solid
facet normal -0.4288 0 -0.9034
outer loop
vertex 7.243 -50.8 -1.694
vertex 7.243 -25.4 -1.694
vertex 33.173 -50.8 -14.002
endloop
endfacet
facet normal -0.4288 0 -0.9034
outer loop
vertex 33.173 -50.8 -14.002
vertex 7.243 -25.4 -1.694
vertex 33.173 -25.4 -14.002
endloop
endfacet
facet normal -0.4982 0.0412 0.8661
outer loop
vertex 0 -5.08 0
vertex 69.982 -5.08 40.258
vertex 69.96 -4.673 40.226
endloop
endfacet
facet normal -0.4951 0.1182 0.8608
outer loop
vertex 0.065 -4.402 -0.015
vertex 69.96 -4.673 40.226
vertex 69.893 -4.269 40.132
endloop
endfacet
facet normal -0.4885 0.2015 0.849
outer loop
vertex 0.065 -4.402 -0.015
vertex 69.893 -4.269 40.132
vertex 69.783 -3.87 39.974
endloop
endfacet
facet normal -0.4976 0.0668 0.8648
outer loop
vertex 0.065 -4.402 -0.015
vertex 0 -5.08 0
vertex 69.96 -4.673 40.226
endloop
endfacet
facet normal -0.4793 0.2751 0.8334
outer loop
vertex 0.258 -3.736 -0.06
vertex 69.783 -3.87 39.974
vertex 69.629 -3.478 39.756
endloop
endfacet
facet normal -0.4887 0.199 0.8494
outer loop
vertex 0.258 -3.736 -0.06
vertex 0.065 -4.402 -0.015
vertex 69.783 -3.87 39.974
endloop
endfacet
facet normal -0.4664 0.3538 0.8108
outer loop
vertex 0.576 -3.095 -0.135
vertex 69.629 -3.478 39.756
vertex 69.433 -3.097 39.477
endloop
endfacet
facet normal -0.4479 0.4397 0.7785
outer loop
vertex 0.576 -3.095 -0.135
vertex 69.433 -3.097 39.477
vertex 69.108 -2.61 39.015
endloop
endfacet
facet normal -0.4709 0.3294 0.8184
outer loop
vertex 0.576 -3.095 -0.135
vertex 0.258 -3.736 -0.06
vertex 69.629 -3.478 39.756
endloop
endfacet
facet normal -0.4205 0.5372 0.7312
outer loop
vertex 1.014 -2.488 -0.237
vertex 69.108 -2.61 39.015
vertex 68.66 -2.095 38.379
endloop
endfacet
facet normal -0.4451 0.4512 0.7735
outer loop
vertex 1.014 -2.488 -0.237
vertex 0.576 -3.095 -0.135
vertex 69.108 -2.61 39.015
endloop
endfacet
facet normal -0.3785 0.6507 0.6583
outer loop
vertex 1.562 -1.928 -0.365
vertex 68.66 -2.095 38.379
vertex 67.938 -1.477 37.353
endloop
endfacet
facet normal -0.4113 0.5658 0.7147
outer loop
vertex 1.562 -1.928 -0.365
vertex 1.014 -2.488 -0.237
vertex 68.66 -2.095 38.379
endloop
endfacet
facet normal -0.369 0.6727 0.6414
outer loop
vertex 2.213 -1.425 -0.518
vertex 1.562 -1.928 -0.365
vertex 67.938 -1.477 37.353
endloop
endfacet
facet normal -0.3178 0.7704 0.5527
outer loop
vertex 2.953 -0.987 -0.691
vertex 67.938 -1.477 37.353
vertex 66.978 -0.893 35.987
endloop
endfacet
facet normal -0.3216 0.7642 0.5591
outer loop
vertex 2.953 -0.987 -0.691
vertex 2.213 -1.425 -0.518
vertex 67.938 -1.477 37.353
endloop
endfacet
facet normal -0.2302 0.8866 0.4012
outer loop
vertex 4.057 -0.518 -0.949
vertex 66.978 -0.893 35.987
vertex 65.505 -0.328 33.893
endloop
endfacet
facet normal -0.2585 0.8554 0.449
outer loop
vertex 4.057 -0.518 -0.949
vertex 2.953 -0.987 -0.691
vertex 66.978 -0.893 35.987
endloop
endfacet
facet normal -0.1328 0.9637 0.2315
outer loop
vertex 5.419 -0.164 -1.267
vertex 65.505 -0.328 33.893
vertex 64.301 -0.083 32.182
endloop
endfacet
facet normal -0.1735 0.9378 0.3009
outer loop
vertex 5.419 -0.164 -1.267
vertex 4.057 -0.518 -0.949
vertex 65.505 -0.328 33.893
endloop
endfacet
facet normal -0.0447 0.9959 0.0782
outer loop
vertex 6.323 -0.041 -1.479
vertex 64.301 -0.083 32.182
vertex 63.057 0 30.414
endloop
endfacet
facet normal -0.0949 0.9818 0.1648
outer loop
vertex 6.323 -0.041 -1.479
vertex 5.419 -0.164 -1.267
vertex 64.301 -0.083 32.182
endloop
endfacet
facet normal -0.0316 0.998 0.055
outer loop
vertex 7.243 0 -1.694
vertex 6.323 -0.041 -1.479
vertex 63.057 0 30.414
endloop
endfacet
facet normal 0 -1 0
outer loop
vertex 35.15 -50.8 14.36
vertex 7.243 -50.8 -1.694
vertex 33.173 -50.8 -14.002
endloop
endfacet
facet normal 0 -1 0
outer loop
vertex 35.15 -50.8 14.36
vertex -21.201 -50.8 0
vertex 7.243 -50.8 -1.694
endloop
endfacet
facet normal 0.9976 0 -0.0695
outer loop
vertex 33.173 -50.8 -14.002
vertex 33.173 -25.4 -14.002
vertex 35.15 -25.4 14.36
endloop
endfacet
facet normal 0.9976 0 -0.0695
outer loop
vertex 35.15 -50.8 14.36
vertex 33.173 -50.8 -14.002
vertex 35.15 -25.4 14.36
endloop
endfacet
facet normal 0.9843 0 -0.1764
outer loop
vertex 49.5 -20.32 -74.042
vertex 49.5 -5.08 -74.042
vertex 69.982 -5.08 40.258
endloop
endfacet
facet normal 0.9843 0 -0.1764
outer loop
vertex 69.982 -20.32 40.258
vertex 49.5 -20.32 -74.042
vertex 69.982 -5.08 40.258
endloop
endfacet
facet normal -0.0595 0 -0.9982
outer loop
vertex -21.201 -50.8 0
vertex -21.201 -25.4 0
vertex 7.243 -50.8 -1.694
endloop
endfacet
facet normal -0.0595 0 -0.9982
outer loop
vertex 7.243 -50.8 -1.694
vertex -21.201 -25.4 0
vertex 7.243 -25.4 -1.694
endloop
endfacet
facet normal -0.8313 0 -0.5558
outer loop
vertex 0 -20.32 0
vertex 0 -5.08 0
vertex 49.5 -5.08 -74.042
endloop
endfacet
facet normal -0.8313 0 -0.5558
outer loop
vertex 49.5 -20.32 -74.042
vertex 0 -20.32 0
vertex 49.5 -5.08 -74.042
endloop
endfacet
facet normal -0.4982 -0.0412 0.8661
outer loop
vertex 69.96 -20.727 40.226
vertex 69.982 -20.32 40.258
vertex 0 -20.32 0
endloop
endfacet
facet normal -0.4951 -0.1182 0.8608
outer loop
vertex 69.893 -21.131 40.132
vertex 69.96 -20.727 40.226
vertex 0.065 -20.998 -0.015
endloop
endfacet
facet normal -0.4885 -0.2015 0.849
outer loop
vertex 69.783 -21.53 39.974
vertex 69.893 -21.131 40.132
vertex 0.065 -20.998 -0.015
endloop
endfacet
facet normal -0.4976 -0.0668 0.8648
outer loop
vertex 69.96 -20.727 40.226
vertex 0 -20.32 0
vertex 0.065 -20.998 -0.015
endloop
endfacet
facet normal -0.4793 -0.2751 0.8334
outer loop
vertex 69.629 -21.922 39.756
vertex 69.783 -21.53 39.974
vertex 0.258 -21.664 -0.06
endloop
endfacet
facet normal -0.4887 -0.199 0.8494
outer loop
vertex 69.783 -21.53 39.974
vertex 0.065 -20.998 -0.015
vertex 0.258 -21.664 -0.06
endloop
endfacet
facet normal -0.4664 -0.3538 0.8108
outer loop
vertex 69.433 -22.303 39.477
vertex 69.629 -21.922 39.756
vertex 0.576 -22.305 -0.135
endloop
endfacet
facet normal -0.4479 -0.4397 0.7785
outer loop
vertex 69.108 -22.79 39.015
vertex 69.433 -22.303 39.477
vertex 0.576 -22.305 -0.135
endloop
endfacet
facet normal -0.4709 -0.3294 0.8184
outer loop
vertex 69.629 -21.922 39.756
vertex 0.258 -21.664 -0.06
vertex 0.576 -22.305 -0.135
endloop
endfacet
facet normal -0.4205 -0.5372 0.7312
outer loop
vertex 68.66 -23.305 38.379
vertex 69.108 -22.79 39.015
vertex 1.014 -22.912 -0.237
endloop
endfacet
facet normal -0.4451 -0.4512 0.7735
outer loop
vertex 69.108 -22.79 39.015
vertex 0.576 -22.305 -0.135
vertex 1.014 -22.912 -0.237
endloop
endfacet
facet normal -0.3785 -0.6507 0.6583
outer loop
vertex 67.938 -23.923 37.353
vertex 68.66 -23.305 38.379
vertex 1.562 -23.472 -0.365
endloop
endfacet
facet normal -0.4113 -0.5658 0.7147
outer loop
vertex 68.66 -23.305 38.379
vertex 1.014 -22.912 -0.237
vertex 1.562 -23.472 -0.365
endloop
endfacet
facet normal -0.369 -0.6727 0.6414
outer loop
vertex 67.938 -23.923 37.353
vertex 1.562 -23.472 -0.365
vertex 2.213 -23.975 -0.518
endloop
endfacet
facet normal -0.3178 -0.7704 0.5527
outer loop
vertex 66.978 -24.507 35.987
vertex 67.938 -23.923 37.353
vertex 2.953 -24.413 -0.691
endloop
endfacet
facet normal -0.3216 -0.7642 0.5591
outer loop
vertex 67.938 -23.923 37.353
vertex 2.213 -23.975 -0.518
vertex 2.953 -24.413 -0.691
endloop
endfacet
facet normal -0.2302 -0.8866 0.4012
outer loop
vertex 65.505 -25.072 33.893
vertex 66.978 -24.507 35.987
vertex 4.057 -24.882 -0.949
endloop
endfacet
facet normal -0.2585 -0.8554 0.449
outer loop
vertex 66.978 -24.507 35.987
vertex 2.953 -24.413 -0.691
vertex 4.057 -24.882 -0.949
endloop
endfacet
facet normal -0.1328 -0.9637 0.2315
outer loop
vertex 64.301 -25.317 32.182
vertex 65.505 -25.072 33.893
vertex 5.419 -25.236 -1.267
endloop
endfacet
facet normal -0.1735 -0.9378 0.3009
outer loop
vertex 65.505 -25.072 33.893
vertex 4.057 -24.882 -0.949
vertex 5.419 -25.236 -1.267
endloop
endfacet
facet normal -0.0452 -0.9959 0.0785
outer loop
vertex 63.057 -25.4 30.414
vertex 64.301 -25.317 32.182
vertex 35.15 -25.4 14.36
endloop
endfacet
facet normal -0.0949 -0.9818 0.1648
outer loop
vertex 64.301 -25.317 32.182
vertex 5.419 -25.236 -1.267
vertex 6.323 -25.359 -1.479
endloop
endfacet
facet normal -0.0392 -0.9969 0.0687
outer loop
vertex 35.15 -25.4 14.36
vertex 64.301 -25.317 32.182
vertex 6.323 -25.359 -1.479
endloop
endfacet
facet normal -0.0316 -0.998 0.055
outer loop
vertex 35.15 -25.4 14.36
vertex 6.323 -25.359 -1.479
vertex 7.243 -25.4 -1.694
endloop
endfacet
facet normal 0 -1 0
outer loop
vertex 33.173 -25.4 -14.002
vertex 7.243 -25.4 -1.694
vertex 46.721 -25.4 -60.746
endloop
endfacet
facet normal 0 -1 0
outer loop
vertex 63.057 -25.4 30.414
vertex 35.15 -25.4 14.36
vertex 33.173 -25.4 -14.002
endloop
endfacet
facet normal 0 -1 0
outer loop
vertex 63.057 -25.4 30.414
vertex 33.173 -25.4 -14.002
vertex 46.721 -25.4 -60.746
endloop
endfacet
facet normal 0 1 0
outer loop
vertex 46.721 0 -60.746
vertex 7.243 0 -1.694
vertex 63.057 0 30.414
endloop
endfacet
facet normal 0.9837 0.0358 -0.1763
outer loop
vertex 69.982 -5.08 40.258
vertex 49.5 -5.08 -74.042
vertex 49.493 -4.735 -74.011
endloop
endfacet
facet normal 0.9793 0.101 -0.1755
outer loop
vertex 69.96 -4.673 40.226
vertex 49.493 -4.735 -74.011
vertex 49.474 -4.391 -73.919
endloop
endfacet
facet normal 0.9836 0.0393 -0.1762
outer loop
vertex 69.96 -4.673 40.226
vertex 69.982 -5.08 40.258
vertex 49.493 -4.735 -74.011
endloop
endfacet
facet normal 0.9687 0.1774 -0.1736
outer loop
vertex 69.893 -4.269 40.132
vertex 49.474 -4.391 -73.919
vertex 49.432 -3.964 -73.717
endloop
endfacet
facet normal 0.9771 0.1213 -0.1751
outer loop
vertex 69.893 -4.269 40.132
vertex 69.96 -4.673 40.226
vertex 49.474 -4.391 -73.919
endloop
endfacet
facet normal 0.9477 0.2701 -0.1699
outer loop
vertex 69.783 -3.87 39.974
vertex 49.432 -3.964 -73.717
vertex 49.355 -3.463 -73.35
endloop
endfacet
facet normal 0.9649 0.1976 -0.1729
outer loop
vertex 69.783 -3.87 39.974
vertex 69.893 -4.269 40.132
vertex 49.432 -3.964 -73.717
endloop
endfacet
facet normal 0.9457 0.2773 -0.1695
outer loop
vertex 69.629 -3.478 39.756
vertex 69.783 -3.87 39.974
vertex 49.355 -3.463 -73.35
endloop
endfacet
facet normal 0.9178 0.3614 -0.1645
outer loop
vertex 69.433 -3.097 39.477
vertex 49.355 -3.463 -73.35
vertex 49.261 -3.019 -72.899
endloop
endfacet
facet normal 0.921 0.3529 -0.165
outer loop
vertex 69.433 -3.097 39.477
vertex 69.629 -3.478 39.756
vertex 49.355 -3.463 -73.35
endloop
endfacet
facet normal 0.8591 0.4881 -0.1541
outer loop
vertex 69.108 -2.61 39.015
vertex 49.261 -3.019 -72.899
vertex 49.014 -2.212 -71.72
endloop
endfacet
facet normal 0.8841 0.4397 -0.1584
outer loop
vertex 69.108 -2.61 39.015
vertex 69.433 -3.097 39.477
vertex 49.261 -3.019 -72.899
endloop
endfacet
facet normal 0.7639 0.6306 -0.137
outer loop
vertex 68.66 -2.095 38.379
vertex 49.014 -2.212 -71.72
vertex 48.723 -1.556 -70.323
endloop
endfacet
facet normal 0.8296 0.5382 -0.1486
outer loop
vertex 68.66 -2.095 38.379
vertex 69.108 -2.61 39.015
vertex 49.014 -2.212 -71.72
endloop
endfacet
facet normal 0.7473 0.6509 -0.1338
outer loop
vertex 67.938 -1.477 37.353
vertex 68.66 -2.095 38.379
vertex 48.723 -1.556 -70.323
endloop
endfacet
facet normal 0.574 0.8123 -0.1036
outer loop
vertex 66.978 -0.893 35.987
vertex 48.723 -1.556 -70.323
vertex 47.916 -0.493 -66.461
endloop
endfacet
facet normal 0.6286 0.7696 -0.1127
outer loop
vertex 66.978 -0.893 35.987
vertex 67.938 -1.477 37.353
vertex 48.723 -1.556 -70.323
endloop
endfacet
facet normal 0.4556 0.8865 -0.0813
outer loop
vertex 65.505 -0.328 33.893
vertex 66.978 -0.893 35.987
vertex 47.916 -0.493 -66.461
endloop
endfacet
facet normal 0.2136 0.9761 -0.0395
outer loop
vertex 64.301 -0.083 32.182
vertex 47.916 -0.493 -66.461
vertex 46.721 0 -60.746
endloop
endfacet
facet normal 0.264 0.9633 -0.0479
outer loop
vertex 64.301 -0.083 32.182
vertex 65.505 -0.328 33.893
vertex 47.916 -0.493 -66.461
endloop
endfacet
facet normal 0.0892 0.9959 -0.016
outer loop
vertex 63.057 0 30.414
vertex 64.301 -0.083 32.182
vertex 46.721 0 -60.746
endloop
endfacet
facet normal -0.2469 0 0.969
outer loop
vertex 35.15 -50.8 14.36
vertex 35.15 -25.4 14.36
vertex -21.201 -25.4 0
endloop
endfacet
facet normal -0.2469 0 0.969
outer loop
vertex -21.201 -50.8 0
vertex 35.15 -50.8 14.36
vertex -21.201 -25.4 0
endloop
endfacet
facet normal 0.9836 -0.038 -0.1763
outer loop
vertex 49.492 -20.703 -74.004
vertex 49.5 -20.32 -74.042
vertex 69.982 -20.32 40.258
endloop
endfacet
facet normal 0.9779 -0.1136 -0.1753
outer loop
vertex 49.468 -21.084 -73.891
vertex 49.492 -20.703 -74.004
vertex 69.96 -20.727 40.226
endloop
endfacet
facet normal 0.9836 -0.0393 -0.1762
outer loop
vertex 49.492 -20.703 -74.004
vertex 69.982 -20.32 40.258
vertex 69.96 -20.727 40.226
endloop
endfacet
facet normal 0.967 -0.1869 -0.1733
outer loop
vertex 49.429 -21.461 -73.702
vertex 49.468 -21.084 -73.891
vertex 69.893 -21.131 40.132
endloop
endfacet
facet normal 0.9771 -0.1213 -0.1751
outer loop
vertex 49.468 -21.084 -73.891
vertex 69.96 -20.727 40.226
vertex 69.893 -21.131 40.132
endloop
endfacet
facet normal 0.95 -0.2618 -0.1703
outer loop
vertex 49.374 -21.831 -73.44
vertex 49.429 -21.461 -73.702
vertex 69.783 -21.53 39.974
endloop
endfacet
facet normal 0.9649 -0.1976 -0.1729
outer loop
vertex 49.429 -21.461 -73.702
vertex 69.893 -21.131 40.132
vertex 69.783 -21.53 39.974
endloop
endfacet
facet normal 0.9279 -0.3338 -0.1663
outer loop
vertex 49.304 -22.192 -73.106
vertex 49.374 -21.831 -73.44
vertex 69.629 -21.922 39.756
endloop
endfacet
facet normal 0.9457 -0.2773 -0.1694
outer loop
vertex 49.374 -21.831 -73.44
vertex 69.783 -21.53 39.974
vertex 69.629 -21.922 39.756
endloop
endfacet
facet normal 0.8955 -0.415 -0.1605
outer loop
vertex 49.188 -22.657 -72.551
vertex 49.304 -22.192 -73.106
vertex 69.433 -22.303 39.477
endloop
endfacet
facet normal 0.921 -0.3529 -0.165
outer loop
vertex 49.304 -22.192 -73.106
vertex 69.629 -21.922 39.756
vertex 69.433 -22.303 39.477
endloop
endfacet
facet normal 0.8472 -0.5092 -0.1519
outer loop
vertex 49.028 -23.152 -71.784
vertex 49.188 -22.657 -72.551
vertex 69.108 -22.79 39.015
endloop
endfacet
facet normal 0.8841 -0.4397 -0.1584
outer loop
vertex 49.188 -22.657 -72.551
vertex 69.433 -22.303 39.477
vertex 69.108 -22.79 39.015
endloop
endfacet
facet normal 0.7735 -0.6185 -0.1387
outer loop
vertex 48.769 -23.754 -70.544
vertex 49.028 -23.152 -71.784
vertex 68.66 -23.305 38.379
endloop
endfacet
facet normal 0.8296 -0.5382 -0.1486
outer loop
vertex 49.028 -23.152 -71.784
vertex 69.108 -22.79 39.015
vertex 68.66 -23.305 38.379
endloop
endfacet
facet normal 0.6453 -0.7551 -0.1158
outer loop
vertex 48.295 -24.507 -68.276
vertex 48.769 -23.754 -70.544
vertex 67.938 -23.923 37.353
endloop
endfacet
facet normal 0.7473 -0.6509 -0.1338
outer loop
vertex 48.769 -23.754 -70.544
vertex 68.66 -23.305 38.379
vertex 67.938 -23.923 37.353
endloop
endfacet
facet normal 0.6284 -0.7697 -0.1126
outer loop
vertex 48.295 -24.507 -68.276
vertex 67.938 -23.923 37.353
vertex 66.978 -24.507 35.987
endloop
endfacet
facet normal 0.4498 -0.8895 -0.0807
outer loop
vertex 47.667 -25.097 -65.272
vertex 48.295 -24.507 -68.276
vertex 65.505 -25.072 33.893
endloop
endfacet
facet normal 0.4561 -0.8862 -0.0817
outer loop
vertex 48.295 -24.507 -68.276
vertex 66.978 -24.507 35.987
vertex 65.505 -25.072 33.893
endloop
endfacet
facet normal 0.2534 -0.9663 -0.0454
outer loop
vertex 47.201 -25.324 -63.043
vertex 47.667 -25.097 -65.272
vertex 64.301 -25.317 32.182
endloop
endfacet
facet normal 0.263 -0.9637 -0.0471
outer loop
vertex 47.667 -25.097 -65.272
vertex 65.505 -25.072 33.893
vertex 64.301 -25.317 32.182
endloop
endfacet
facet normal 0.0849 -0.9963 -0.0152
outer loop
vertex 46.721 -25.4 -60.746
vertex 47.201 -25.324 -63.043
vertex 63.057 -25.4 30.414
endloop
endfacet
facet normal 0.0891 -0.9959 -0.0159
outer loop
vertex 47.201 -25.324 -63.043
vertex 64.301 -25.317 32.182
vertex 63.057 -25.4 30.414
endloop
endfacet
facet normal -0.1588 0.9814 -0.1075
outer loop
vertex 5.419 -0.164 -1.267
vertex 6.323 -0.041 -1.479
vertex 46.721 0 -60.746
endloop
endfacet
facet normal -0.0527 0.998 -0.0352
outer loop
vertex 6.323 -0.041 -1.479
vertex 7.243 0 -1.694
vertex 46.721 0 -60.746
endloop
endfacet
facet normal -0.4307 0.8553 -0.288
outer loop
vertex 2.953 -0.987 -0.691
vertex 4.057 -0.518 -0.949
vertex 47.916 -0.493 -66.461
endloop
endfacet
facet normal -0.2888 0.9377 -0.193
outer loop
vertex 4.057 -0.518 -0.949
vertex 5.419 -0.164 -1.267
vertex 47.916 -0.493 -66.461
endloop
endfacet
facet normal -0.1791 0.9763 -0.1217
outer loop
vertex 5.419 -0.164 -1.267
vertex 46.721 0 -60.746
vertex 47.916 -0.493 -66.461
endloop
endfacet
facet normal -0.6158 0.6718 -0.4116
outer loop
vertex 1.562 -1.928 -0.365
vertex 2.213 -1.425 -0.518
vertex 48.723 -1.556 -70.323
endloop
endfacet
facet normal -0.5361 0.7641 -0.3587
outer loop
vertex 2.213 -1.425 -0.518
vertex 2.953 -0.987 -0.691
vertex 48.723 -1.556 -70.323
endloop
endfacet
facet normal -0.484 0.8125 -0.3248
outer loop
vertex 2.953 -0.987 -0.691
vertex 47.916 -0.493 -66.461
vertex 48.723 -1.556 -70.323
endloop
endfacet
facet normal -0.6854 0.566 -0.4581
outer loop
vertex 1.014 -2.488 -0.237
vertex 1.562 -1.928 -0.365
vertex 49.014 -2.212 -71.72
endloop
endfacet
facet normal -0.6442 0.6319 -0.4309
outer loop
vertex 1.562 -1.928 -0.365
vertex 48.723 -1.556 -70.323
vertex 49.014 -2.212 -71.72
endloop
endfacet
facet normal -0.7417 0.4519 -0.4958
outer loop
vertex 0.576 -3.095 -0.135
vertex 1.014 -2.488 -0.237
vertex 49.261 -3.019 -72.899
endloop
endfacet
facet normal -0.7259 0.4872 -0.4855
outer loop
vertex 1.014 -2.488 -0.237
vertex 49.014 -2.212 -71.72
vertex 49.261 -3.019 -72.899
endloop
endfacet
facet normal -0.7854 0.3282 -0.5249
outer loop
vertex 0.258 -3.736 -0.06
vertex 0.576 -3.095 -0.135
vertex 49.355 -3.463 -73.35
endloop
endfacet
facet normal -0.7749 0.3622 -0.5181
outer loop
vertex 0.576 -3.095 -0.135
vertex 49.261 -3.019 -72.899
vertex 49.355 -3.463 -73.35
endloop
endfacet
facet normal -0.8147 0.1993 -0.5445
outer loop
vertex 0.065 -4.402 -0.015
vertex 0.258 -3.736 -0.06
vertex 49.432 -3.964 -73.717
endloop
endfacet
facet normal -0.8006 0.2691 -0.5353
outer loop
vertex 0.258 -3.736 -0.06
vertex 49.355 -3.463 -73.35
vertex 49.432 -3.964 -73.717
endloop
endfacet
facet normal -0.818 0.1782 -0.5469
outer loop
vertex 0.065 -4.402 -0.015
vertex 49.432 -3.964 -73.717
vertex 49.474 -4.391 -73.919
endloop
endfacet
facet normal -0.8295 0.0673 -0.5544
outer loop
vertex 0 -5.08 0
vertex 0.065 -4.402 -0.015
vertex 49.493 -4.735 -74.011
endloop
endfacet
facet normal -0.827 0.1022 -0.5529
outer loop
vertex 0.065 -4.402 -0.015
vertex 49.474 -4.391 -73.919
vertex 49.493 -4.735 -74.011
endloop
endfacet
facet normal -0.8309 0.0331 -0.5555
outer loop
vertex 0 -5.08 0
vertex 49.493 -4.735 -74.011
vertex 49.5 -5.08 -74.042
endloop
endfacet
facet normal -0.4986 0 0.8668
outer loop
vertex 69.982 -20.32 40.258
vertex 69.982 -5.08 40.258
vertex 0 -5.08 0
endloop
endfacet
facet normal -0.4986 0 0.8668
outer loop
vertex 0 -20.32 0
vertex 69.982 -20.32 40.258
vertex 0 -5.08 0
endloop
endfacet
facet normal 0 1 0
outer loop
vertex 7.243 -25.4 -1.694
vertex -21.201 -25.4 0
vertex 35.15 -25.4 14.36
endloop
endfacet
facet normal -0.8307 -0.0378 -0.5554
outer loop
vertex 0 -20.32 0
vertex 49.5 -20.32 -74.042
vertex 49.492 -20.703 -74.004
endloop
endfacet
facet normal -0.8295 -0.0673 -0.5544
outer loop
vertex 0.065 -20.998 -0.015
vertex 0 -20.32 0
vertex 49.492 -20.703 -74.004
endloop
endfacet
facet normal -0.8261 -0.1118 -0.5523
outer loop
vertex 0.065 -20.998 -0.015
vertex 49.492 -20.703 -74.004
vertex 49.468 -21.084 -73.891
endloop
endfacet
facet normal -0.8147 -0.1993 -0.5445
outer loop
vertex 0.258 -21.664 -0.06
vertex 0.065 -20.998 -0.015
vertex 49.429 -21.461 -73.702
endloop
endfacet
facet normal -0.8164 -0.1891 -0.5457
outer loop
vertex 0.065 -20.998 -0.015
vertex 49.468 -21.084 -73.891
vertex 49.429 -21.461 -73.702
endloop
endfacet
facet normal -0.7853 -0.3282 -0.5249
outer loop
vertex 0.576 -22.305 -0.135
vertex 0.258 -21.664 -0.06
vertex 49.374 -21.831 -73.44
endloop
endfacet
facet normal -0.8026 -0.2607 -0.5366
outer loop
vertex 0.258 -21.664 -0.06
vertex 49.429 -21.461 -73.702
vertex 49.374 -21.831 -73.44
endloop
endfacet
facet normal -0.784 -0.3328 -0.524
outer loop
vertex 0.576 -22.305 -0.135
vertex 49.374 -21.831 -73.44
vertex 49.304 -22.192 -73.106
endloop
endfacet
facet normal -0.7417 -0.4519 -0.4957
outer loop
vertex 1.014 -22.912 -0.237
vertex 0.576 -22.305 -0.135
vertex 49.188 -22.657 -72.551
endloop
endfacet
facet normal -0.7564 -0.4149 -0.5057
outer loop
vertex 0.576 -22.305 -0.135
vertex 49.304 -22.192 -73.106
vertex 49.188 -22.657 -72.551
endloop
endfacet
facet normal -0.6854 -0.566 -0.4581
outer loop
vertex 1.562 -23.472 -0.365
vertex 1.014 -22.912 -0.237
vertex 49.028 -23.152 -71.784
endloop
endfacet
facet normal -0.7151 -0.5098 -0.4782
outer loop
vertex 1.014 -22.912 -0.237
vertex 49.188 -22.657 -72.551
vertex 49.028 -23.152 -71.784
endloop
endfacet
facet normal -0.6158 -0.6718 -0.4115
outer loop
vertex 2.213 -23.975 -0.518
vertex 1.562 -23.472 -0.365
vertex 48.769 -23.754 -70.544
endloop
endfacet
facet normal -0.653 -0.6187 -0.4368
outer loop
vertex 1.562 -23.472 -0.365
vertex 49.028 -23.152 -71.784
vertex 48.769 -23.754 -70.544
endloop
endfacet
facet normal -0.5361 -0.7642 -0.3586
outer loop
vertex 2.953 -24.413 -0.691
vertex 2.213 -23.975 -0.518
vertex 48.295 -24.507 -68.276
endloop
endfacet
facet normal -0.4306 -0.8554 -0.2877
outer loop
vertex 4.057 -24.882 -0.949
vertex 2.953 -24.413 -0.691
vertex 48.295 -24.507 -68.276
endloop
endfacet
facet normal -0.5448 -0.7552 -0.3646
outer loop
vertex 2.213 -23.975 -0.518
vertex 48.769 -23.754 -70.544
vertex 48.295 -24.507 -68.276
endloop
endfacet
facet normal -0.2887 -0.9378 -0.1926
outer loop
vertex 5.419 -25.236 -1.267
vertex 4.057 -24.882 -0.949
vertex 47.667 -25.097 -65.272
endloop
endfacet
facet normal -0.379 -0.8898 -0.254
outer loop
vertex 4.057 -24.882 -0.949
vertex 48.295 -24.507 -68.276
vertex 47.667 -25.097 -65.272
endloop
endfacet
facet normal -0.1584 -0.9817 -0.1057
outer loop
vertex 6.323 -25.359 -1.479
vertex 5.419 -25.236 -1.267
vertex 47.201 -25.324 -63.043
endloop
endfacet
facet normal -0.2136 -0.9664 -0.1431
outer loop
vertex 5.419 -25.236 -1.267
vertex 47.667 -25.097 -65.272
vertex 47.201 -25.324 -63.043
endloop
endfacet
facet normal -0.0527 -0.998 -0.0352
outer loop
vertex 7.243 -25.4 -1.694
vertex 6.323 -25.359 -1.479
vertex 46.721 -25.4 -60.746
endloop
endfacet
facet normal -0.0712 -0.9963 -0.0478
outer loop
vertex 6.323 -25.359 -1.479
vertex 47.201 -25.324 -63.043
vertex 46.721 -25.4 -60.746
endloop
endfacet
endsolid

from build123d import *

# Parameters (mm, degrees)
F1_DEPTH = 25.4
F2_R     = 5.08
F3_R     = 5.08
F5_DEPTH = 25.4


with BuildPart() as f1:
    # F0 (on Front) → F1 (new body)
    with BuildSketch(Plane.XZ):
        Polygon((69.982089, 40.257905), (0, 0), (49.499534, -74.041769), align=None)
    extrude(amount=F1_DEPTH)

    # F2
    f2_edges = [f1.edges().sort_by_distance(p)[0] for p in [
        (34.991045, -25.4, 20.128952),
        (24.749767, -25.4, -37.020884),
        (59.740812, -25.4, -16.891932),
    ]]
    fillet(f2_edges, radius=F2_R)

    # F3
    f3_edges = [f1.edges().sort_by_distance(p)[0] for p in [
        (34.991045, 0, 20.128952),
        (24.749767, 0, -37.020884),
        (59.740812, 0, -16.891932),
    ]]
    fillet(f3_edges, radius=F3_R)

    # F4 (on face) → F5 (join)
    with BuildSketch(Plane.XZ.offset(25.4)):
        Polygon((-21.201186, 0), (7.243107, -1.693906), (33.173189, -14.002405), (35.150089, 14.359867), align=None)
    extrude(amount=F5_DEPTH)


solid = f1.part
